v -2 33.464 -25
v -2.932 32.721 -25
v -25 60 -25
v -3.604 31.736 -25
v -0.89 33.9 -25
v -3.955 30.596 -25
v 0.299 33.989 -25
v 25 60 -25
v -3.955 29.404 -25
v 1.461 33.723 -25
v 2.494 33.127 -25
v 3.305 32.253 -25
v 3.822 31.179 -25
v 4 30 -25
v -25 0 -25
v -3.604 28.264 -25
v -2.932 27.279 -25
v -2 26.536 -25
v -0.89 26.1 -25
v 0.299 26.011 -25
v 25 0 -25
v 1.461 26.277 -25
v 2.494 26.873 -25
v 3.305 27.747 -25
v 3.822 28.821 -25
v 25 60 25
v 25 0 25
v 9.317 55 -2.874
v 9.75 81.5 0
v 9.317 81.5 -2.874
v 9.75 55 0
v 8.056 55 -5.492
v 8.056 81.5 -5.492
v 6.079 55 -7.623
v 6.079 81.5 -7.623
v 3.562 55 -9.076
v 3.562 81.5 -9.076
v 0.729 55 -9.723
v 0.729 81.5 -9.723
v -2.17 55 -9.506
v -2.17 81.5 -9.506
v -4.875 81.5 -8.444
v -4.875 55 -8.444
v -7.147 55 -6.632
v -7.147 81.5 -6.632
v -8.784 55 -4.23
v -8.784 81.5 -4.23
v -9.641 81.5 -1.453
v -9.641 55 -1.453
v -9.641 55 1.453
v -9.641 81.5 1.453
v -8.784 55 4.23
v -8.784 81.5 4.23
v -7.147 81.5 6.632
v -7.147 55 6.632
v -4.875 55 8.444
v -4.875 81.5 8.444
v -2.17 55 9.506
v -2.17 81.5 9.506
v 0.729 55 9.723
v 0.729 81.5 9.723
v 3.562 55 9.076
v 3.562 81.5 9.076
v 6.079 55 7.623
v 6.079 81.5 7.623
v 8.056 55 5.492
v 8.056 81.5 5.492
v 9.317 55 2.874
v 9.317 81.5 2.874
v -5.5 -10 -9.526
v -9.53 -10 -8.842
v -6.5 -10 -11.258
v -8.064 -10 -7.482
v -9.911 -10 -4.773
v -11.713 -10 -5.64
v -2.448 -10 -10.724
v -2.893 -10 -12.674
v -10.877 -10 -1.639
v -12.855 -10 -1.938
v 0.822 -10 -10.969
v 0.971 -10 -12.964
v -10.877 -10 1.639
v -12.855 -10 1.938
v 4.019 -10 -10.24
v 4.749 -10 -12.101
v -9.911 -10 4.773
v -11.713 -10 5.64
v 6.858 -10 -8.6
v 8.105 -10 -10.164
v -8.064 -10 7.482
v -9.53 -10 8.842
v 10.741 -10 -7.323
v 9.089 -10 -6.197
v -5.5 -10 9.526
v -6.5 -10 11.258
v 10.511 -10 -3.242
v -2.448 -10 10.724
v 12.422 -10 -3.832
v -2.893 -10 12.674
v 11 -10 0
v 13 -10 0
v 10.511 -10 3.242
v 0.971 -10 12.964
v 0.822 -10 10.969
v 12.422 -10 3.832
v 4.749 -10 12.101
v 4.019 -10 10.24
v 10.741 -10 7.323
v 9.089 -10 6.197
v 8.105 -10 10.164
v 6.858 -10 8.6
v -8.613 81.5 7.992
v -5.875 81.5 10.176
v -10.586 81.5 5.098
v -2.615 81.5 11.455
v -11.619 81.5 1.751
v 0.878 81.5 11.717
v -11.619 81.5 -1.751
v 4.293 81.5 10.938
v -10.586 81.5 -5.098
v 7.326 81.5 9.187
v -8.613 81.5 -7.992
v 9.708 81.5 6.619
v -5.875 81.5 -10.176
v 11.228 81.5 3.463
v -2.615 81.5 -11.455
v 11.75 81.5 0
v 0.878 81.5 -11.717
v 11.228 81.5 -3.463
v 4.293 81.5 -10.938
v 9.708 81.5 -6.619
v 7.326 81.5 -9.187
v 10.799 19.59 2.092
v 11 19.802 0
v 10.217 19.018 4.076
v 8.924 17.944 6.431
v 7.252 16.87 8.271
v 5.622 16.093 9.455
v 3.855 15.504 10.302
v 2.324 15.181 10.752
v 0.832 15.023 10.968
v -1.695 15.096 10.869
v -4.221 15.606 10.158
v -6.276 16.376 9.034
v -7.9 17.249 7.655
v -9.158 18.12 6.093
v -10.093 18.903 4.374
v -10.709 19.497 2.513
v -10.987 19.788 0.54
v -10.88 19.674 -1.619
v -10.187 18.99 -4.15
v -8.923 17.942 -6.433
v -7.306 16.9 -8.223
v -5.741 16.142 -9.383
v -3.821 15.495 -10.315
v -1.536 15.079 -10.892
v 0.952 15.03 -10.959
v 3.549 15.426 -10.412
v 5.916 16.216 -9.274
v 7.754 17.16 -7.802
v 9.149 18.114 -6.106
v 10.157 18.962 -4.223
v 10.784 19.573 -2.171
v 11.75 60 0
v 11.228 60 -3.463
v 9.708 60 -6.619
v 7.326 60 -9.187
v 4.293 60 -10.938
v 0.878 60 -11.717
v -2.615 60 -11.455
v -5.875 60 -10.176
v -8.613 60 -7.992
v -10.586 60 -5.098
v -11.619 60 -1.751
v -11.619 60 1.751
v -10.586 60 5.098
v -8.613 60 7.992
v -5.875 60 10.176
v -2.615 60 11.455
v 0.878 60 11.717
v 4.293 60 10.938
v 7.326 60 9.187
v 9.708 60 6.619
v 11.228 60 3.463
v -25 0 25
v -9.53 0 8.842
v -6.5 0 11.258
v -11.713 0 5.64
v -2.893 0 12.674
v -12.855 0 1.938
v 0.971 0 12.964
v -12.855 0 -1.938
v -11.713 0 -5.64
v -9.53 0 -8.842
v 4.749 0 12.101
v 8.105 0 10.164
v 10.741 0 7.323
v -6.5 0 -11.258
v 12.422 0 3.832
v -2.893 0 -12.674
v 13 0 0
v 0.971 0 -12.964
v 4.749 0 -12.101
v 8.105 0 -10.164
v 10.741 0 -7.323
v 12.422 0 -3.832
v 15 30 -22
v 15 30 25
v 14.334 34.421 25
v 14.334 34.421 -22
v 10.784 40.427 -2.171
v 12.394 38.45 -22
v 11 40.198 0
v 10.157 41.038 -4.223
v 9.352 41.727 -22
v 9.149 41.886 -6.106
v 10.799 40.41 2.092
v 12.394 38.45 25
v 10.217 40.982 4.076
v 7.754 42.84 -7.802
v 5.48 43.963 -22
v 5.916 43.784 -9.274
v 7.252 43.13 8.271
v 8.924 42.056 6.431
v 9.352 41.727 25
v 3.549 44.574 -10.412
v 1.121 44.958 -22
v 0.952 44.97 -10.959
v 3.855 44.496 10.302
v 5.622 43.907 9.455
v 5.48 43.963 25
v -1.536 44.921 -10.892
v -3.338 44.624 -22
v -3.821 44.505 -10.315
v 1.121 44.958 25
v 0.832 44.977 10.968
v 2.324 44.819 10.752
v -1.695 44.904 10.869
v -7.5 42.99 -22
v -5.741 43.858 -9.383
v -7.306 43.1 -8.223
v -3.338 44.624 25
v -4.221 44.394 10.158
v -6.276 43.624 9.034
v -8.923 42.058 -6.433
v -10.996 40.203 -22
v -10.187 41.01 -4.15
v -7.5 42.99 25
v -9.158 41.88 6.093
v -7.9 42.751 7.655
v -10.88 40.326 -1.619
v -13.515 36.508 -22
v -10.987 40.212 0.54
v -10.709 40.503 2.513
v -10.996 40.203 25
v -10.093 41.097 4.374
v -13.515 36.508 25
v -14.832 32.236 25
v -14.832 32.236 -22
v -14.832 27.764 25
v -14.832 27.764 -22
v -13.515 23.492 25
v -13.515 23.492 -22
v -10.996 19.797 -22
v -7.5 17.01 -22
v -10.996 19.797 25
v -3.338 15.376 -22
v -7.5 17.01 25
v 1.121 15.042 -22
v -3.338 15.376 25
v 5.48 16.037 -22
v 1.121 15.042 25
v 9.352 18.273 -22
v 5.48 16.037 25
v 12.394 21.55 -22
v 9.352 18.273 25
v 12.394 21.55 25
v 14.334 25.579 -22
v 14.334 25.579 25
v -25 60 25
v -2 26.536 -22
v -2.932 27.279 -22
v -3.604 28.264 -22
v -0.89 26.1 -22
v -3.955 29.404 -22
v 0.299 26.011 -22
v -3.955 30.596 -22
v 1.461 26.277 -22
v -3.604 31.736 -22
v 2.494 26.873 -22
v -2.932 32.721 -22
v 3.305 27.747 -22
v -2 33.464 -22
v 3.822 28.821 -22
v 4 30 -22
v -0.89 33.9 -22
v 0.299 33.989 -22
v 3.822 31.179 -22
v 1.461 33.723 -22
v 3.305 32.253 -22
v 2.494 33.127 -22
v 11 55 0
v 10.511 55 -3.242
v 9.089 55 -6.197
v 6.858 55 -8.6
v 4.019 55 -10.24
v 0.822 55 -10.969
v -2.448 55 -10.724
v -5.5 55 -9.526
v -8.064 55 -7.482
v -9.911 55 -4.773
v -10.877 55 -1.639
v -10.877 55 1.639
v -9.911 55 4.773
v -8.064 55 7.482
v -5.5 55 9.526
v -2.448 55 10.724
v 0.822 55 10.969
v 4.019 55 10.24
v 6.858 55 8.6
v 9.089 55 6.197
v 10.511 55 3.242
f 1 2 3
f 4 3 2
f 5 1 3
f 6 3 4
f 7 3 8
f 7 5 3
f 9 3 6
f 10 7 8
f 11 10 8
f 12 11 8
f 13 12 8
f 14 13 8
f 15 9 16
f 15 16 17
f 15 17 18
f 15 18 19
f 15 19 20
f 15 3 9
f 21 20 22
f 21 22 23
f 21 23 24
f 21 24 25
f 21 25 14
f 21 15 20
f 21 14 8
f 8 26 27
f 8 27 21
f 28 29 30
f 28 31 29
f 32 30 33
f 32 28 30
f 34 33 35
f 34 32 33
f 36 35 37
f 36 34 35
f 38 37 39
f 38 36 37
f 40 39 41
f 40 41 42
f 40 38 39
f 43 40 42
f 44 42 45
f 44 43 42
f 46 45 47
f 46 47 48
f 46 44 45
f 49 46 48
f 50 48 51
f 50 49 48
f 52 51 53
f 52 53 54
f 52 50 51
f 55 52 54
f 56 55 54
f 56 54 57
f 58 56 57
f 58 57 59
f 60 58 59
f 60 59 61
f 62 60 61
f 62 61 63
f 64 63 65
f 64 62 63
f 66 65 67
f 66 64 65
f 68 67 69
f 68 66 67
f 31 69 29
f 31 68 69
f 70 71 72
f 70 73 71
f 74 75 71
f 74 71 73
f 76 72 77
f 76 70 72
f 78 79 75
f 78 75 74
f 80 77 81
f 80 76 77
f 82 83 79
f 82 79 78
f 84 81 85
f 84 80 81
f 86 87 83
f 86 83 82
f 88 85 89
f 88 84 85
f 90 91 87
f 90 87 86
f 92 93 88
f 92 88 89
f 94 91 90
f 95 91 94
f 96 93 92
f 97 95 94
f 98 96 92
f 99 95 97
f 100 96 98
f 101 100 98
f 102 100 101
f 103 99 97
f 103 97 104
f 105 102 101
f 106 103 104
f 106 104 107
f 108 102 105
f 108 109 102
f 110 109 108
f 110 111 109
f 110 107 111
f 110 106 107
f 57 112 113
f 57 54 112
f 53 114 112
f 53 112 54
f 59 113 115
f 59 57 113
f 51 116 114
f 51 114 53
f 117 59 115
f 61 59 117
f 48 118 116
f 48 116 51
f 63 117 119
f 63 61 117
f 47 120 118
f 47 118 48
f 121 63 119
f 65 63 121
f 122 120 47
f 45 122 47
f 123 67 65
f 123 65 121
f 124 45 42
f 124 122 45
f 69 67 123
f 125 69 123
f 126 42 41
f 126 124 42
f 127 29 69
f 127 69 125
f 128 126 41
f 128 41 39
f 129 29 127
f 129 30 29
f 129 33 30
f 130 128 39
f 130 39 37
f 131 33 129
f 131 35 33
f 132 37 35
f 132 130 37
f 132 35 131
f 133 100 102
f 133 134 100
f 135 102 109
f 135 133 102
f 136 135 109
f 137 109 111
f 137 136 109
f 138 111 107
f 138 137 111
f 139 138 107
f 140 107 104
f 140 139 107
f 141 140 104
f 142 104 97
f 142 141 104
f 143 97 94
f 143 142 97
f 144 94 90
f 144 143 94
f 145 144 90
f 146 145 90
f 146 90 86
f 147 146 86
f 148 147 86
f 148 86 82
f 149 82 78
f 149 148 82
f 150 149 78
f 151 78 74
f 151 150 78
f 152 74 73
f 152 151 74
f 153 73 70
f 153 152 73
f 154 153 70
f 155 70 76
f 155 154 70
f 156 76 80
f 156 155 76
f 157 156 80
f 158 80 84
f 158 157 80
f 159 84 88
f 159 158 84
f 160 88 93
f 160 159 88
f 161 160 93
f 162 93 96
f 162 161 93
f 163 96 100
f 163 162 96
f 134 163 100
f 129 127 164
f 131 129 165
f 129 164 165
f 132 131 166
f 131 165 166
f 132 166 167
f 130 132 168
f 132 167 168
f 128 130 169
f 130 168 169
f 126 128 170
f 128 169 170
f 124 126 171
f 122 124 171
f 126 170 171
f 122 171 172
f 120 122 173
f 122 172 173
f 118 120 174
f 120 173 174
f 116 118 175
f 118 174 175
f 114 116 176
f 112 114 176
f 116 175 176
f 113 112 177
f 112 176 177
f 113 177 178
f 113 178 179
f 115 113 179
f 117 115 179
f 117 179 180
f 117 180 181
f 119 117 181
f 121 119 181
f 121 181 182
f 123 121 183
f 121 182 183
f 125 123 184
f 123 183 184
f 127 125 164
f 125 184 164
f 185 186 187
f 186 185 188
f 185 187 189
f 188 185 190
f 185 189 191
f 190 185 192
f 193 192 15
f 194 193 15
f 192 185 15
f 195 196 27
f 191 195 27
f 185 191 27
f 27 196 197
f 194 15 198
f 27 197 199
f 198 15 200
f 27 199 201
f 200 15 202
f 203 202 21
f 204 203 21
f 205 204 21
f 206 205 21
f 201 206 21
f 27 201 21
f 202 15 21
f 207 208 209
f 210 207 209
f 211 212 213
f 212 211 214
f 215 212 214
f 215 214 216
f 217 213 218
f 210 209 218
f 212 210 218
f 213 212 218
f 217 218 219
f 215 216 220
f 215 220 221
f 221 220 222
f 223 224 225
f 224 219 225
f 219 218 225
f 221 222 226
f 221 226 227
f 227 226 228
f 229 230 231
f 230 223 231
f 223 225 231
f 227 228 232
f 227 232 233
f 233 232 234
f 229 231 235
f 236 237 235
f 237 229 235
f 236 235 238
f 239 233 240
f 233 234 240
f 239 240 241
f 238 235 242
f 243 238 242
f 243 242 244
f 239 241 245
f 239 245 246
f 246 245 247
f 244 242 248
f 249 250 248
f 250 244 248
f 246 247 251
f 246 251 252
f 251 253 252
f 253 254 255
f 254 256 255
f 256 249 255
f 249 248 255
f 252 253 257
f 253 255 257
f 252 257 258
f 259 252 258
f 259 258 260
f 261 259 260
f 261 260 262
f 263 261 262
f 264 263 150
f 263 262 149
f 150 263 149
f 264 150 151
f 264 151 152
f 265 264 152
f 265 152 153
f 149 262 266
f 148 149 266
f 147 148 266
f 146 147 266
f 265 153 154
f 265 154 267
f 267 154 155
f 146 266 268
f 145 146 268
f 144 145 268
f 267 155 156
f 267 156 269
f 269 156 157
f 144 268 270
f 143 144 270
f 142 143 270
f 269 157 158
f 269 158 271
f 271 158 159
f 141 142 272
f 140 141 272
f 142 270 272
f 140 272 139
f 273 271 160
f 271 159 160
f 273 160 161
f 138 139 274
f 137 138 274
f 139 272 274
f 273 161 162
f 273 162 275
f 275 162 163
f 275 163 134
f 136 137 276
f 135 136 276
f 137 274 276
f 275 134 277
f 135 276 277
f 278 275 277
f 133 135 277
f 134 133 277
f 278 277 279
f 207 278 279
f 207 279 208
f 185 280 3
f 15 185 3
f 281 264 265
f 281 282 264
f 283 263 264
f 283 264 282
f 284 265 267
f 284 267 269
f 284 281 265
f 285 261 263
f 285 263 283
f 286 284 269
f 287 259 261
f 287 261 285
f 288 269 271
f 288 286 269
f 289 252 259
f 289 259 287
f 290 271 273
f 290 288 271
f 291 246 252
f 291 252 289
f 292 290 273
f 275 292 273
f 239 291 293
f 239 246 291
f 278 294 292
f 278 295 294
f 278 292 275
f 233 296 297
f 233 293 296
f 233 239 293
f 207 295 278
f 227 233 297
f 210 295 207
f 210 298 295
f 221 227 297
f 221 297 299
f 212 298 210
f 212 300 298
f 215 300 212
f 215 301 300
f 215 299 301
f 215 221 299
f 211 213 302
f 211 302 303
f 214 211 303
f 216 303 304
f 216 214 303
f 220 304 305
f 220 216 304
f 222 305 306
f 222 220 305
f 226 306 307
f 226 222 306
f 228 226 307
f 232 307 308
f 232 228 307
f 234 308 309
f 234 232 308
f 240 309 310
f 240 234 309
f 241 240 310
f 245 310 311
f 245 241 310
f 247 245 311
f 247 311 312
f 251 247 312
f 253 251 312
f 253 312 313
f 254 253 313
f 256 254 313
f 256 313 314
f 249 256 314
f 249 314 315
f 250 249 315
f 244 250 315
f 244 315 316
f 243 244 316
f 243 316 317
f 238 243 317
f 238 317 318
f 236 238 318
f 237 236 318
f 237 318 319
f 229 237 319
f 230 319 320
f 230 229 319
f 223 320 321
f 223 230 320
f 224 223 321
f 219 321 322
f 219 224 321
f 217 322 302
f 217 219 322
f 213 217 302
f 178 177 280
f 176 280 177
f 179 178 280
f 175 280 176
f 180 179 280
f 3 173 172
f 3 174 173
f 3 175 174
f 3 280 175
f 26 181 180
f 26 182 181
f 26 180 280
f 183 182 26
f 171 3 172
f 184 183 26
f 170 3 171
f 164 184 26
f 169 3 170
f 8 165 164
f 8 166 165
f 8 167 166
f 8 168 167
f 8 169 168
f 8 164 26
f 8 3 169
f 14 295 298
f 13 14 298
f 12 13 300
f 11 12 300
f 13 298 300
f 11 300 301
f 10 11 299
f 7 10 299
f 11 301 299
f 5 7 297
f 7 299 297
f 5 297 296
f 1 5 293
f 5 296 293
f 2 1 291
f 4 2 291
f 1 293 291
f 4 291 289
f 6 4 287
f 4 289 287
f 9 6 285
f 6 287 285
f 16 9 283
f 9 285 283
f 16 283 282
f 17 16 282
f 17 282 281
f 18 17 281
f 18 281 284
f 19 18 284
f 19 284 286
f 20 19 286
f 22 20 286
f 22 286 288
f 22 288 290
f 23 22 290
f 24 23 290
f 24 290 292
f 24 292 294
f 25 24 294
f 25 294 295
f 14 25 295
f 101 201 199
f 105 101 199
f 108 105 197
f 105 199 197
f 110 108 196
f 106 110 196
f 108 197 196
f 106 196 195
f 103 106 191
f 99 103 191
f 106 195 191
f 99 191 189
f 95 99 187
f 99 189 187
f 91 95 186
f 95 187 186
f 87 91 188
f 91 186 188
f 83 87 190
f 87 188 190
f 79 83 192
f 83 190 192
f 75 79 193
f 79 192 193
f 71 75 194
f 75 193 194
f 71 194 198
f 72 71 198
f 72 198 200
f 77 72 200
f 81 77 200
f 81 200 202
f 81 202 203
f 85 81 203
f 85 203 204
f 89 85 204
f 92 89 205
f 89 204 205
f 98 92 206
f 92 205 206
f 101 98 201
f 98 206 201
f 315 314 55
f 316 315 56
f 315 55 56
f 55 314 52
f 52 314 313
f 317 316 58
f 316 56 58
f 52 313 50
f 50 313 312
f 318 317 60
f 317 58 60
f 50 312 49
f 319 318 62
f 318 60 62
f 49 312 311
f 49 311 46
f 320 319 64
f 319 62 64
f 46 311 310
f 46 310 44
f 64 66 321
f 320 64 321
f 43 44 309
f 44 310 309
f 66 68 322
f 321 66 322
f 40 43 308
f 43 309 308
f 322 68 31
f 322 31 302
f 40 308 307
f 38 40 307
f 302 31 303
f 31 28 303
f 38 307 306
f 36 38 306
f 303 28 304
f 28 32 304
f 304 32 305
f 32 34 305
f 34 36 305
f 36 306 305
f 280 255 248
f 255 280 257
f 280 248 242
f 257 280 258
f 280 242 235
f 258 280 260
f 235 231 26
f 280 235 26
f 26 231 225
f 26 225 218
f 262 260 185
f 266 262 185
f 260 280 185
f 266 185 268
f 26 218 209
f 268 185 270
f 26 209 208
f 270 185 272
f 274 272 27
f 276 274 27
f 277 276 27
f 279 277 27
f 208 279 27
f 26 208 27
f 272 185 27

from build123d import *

# Parameters (mm, degrees)
CROQUIS1_W                   = 50
CROQUIS1_H                   = 50
CROQUIS1_R                   = 11
SALIENTE_EXTRUIR1_DEPTH      = 60
CROQUIS3_R                   = 15
CORTAR_EXTRUIR1_DEPTH        = 47
CROQUIS4_R                   = 4
CORTAR_EXTRUIR2_DEPTH        = 10
CROQUIS5_R                   = 11.75
CROQUIS5_R_2                 = 9.75
SALIENTE_EXTRUIR3_DEPTH      = 21.5
SALIENTE_EXTRUIR3_DEPTH_BACK = 5
CROQUIS7_R                   = 13
CROQUIS7_R_2                 = 11
SALIENTE_EXTRUIR4_DEPTH      = 10


with BuildPart() as part:
    # Croquis1 → Saliente-Extruir1 (new body)
    with BuildSketch(Plane(origin=(0, 0, 0), x_dir=(1, 0, 0), z_dir=(0, 1, 0))):
        Rectangle(CROQUIS1_W, CROQUIS1_H)
        Circle(CROQUIS1_R, mode=Mode.SUBTRACT)
    extrude(amount=SALIENTE_EXTRUIR1_DEPTH)

    # Croquis3 → Cortar-Extruir1 (cut)
    with BuildSketch(Plane.XY.offset(25)):
        with Locations((0, 30)):
            Circle(CROQUIS3_R)
    extrude(amount=-CORTAR_EXTRUIR1_DEPTH, mode=Mode.SUBTRACT)

    # Croquis4 → Cortar-Extruir2 (cut)
    with BuildSketch(Plane.XY.offset(-22)):
        with Locations((0, 30)):
            Circle(CROQUIS4_R)
    extrude(amount=-CORTAR_EXTRUIR2_DEPTH, mode=Mode.SUBTRACT)

    # Croquis5 → Saliente-Extruir3 (add, two sides)
    with BuildSketch(Plane(origin=(0, 60, 0), x_dir=(1, 0, 0), z_dir=(0, 1, 0))) as saliente_extruir3_sk:
        Circle(CROQUIS5_R)
        Circle(CROQUIS5_R_2, mode=Mode.SUBTRACT)
    extrude(amount=SALIENTE_EXTRUIR3_DEPTH)
    extrude(saliente_extruir3_sk.sketch, amount=-SALIENTE_EXTRUIR3_DEPTH_BACK)

    # Croquis7 → Saliente-Extruir4 (add)
    with BuildSketch(Plane.XZ):
        Circle(CROQUIS7_R)
        Circle(CROQUIS7_R_2, mode=Mode.SUBTRACT)
    extrude(amount=SALIENTE_EXTRUIR4_DEPTH)


solid = part.part
